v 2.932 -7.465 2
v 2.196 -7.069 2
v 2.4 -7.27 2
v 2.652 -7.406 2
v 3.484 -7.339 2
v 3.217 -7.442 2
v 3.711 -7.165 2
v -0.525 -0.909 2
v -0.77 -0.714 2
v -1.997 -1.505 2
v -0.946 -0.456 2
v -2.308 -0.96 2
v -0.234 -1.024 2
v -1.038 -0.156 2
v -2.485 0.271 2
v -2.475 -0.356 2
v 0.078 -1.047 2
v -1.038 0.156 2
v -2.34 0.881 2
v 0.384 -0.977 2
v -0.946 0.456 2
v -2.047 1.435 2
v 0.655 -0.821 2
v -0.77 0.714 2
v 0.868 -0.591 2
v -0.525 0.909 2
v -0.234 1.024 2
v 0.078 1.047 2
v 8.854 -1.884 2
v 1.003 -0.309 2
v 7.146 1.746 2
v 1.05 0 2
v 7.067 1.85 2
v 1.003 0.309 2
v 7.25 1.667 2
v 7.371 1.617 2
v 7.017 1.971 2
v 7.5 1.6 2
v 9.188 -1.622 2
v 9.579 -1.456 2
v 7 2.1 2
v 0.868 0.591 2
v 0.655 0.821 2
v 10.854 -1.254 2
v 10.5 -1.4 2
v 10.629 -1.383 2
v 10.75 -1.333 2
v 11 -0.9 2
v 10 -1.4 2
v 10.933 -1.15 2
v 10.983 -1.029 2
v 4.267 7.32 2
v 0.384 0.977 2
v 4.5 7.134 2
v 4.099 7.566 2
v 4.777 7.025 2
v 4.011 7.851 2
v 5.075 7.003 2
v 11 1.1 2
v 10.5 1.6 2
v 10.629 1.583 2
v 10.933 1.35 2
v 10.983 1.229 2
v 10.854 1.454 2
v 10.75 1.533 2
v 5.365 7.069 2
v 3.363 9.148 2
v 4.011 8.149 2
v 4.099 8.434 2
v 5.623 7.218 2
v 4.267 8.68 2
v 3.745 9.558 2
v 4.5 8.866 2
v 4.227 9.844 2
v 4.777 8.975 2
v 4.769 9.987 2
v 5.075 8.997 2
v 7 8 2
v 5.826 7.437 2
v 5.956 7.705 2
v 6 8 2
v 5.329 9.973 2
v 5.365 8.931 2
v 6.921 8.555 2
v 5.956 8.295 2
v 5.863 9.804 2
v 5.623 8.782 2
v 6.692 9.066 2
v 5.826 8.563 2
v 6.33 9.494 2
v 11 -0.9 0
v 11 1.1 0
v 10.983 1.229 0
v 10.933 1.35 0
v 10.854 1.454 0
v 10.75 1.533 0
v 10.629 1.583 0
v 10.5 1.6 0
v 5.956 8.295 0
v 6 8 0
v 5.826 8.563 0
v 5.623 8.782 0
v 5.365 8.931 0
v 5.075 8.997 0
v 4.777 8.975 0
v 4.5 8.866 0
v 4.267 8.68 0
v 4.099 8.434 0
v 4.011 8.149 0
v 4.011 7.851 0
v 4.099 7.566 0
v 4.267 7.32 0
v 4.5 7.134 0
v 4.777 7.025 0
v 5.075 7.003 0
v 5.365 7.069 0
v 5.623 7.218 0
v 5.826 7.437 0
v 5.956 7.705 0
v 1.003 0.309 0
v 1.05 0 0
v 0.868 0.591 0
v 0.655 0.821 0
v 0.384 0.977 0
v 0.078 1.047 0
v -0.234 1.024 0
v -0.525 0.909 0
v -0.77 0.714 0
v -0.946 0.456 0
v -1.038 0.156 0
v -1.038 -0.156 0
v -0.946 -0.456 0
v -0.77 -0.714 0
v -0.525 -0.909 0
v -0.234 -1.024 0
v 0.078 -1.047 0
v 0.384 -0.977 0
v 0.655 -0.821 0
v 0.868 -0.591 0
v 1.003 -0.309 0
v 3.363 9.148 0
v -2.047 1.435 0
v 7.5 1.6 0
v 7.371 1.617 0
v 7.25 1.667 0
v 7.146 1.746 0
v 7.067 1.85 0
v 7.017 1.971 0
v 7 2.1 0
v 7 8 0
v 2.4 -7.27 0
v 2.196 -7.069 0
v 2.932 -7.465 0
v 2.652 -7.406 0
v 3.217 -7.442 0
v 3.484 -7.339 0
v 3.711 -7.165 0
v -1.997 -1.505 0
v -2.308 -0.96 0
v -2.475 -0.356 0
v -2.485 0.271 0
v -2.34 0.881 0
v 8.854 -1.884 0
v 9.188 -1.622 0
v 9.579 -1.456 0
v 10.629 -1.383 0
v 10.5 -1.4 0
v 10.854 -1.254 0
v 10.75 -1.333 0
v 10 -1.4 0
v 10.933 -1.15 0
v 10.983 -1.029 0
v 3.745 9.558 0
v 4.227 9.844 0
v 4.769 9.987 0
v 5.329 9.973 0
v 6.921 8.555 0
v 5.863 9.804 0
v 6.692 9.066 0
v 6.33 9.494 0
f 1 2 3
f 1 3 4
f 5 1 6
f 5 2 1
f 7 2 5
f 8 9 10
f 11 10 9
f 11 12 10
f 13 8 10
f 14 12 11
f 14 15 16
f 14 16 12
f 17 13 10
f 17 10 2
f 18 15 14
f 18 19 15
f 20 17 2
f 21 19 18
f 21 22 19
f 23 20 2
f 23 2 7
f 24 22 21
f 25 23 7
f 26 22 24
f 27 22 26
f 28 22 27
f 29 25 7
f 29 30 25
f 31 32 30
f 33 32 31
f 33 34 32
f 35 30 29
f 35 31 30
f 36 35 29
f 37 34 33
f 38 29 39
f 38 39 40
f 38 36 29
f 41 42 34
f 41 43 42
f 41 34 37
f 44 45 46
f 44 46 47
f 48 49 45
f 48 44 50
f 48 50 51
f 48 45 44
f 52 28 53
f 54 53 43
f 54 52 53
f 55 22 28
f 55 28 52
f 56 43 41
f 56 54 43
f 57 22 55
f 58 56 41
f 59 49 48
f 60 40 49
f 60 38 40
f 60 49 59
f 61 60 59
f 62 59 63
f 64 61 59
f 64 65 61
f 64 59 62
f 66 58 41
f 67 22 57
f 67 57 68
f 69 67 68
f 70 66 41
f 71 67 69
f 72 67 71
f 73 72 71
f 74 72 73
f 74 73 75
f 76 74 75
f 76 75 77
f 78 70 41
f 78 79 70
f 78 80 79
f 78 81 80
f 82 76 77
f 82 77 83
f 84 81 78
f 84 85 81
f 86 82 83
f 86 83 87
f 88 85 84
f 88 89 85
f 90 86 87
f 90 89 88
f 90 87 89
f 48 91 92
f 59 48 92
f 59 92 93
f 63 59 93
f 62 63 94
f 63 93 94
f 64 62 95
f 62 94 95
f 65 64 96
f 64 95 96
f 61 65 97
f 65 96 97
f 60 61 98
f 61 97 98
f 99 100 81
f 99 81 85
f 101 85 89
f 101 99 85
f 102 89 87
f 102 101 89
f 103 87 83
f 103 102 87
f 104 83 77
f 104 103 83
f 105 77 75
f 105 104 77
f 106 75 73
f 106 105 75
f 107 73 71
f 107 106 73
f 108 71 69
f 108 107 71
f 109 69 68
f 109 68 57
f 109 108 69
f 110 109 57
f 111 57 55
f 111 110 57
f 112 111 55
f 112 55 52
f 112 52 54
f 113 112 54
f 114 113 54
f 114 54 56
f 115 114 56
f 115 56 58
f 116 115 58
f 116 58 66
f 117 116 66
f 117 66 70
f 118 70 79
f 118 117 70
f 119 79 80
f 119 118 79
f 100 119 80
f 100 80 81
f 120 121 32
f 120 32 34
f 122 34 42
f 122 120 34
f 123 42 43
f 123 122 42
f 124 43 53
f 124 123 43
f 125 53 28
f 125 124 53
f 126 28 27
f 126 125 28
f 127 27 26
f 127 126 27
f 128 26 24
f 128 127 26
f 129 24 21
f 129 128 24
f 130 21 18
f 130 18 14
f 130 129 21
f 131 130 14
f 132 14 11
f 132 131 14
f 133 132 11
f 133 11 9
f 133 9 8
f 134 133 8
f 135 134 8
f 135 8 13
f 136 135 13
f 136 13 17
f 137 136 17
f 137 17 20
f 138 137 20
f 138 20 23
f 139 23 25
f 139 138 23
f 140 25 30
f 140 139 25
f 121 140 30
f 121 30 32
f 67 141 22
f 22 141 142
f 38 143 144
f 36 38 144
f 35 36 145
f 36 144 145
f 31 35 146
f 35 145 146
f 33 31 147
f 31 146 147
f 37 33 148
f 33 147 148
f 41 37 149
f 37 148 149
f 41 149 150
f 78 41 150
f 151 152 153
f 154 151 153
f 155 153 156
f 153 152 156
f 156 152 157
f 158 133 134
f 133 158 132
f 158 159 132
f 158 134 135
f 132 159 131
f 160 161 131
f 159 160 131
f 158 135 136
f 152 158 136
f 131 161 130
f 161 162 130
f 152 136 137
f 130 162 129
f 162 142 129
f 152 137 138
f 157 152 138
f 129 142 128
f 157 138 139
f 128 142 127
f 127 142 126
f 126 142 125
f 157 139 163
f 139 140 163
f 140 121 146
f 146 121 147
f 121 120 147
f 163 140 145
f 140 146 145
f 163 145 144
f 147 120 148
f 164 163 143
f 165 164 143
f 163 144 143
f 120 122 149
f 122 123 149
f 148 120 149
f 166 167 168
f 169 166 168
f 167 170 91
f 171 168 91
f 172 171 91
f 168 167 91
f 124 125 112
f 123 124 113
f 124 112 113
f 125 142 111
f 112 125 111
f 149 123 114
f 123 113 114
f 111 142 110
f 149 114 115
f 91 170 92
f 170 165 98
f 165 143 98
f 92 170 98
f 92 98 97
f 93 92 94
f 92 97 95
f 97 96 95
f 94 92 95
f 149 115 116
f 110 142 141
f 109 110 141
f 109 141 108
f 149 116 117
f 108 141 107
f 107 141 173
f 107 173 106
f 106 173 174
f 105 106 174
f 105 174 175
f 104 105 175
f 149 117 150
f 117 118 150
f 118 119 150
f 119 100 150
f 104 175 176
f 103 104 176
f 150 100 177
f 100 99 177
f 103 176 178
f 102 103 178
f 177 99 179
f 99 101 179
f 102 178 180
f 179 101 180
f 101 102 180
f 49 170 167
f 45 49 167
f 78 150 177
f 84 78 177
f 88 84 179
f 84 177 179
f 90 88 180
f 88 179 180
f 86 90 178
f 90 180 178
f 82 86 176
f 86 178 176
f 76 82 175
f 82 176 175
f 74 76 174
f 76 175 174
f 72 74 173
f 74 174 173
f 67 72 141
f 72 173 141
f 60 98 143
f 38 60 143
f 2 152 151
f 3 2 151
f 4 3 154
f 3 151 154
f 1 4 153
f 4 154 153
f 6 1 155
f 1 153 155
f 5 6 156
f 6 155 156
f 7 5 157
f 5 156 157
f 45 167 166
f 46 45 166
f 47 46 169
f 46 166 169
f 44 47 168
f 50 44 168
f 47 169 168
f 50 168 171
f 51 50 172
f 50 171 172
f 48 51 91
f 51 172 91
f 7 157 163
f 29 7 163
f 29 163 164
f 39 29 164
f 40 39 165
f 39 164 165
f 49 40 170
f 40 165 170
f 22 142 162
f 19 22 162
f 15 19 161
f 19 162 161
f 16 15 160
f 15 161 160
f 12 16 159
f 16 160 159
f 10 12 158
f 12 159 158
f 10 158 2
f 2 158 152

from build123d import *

# Parameters (mm, degrees)
SKETCH_1_R      = 1.05
SKETCH_1_R_2    = 1
EXTRUDE_1_DEPTH = 2


with BuildPart() as part:
    # 草图1 → 凸台-拉伸1 (new body)
    with BuildSketch(Plane.XY):
        with BuildLine():
            Line((10, -1.4), (10.5, -1.4))
            ThreePointArc((10.5, -1.4), (10.853553391, -1.253553391), (11, -0.9))
            Line((11, -0.9), (11, 1.1))
            ThreePointArc((11, 1.1), (10.853553391, 1.453553391), (10.5, 1.6))
            Line((10.5, 1.6), (7.5, 1.6))
            ThreePointArc((7.5, 1.6), (7.146446609, 1.746446609), (7, 2.1))
            Line((7, 2.1), (7, 8))
            ThreePointArc((7, 8), (5.602135251, 9.907205584), (3.36256686, 9.148395712))
            Line((3.36256686, 9.148395712), (-2.046791425, 1.435494641))
            ThreePointArc((-2.046791425, 1.435494641), (-2.499635612, -0.042682638), (-1.996588775, -1.504537558))
            Line((-1.996588775, -1.504537558), (2.196410118, -7.068835026))
            ThreePointArc((2.196410118, -7.068835026), (2.931927352, -7.465026056), (3.711498172, -7.164655833))
            Line((3.711498172, -7.164655833), (8.85367593, -1.883782671))
            ThreePointArc((8.85367593, -1.883782671), (9.377885753, -1.525898964), (10, -1.4))
        make_face()
        Circle(SKETCH_1_R, mode=Mode.SUBTRACT)
        with Locations((5, 8)):
            Circle(SKETCH_1_R_2, mode=Mode.SUBTRACT)
    extrude(amount=EXTRUDE_1_DEPTH)


solid = part.part
